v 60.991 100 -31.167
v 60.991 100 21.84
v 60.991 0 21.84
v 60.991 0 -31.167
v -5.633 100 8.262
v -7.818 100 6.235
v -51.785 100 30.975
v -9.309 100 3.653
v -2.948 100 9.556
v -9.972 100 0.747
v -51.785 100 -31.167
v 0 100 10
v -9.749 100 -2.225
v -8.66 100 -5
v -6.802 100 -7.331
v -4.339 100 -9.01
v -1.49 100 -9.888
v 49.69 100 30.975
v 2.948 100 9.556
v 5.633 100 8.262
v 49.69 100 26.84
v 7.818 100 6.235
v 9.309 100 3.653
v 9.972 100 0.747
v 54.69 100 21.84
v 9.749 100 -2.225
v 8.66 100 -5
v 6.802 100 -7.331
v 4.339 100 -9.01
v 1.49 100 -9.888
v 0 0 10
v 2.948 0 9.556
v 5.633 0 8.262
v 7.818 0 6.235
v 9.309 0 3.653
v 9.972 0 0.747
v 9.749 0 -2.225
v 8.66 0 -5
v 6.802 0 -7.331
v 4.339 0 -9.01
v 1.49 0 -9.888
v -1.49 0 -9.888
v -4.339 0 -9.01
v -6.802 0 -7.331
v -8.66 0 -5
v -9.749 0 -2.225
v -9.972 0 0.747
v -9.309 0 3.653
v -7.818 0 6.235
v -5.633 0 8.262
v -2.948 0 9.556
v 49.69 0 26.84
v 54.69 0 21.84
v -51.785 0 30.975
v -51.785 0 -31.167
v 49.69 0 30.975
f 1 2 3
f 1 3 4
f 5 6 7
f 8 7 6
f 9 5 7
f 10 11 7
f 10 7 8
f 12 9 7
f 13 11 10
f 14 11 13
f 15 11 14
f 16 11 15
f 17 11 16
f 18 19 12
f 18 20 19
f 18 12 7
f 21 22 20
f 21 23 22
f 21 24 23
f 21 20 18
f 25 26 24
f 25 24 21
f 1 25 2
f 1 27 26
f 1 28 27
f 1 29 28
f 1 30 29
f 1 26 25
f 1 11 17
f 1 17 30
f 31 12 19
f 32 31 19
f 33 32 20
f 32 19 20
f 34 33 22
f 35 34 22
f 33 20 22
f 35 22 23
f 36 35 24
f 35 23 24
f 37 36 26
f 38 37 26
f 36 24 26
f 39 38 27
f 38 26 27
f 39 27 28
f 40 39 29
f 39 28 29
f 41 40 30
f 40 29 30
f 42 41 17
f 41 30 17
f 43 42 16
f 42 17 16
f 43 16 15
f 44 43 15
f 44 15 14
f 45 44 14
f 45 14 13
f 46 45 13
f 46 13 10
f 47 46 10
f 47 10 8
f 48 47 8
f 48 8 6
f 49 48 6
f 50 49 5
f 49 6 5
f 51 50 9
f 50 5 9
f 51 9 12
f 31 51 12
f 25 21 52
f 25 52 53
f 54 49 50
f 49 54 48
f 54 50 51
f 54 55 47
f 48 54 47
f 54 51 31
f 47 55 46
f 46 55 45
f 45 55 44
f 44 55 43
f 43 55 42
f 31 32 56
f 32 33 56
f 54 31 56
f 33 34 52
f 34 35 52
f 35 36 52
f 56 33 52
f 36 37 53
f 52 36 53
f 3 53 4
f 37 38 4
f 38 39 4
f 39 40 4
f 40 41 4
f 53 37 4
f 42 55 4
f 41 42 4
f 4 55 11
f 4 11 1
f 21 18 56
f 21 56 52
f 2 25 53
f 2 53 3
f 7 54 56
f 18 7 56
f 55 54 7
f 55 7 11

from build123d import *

# Parameters (mm, degrees)
SKETCH3_W           = 112.775418125
SKETCH3_H           = 62.141556926
BOSS_EXTRUDE1_DEPTH = 100
SKETCH4_W           = 11.300404478
SKETCH4_H           = 9.134771786
CUT_EXTRUDE1_DEPTH  = 100
CHAMFER2_SIZE       = 5
SKETCH5_R           = 10
CUT_EXTRUDE2_DEPTH  = 100


with BuildPart() as part:
    # Sketch3 → Boss-Extrude1 (new body)
    with BuildSketch(Plane(origin=(0, 0, 0), x_dir=(1, 0, 0), z_dir=(0, 1, 0))):
        with Locations((4.603078291, 0.095897464)):
            Rectangle(SKETCH3_W, SKETCH3_H)
    extrude(amount=BOSS_EXTRUDE1_DEPTH)

    # Sketch4 → Cut-Extrude1 (cut)
    with BuildSketch(Plane(origin=(0, 100, 0), x_dir=(1, 0, 0), z_dir=(0, 1, 0))):
        with Locations((55.340585114, -26.407495106)):
            Rectangle(SKETCH4_W, SKETCH4_H)
    extrude(amount=-CUT_EXTRUDE1_DEPTH, mode=Mode.SUBTRACT)

    # Chamfer2
    chamfer2_edges = [part.edges().sort_by_distance(p)[0] for p in [
        (49.690382875, 50, 21.840109213),
    ]]
    chamfer(chamfer2_edges, length=CHAMFER2_SIZE)

    # Sketch5 → Cut-Extrude2 (cut)
    with BuildSketch(Plane(origin=(0, 100, 0), x_dir=(1, 0, 0), z_dir=(0, 1, 0))):
        Circle(SKETCH5_R)
    extrude(amount=-CUT_EXTRUDE2_DEPTH, mode=Mode.SUBTRACT)


solid = part.part
